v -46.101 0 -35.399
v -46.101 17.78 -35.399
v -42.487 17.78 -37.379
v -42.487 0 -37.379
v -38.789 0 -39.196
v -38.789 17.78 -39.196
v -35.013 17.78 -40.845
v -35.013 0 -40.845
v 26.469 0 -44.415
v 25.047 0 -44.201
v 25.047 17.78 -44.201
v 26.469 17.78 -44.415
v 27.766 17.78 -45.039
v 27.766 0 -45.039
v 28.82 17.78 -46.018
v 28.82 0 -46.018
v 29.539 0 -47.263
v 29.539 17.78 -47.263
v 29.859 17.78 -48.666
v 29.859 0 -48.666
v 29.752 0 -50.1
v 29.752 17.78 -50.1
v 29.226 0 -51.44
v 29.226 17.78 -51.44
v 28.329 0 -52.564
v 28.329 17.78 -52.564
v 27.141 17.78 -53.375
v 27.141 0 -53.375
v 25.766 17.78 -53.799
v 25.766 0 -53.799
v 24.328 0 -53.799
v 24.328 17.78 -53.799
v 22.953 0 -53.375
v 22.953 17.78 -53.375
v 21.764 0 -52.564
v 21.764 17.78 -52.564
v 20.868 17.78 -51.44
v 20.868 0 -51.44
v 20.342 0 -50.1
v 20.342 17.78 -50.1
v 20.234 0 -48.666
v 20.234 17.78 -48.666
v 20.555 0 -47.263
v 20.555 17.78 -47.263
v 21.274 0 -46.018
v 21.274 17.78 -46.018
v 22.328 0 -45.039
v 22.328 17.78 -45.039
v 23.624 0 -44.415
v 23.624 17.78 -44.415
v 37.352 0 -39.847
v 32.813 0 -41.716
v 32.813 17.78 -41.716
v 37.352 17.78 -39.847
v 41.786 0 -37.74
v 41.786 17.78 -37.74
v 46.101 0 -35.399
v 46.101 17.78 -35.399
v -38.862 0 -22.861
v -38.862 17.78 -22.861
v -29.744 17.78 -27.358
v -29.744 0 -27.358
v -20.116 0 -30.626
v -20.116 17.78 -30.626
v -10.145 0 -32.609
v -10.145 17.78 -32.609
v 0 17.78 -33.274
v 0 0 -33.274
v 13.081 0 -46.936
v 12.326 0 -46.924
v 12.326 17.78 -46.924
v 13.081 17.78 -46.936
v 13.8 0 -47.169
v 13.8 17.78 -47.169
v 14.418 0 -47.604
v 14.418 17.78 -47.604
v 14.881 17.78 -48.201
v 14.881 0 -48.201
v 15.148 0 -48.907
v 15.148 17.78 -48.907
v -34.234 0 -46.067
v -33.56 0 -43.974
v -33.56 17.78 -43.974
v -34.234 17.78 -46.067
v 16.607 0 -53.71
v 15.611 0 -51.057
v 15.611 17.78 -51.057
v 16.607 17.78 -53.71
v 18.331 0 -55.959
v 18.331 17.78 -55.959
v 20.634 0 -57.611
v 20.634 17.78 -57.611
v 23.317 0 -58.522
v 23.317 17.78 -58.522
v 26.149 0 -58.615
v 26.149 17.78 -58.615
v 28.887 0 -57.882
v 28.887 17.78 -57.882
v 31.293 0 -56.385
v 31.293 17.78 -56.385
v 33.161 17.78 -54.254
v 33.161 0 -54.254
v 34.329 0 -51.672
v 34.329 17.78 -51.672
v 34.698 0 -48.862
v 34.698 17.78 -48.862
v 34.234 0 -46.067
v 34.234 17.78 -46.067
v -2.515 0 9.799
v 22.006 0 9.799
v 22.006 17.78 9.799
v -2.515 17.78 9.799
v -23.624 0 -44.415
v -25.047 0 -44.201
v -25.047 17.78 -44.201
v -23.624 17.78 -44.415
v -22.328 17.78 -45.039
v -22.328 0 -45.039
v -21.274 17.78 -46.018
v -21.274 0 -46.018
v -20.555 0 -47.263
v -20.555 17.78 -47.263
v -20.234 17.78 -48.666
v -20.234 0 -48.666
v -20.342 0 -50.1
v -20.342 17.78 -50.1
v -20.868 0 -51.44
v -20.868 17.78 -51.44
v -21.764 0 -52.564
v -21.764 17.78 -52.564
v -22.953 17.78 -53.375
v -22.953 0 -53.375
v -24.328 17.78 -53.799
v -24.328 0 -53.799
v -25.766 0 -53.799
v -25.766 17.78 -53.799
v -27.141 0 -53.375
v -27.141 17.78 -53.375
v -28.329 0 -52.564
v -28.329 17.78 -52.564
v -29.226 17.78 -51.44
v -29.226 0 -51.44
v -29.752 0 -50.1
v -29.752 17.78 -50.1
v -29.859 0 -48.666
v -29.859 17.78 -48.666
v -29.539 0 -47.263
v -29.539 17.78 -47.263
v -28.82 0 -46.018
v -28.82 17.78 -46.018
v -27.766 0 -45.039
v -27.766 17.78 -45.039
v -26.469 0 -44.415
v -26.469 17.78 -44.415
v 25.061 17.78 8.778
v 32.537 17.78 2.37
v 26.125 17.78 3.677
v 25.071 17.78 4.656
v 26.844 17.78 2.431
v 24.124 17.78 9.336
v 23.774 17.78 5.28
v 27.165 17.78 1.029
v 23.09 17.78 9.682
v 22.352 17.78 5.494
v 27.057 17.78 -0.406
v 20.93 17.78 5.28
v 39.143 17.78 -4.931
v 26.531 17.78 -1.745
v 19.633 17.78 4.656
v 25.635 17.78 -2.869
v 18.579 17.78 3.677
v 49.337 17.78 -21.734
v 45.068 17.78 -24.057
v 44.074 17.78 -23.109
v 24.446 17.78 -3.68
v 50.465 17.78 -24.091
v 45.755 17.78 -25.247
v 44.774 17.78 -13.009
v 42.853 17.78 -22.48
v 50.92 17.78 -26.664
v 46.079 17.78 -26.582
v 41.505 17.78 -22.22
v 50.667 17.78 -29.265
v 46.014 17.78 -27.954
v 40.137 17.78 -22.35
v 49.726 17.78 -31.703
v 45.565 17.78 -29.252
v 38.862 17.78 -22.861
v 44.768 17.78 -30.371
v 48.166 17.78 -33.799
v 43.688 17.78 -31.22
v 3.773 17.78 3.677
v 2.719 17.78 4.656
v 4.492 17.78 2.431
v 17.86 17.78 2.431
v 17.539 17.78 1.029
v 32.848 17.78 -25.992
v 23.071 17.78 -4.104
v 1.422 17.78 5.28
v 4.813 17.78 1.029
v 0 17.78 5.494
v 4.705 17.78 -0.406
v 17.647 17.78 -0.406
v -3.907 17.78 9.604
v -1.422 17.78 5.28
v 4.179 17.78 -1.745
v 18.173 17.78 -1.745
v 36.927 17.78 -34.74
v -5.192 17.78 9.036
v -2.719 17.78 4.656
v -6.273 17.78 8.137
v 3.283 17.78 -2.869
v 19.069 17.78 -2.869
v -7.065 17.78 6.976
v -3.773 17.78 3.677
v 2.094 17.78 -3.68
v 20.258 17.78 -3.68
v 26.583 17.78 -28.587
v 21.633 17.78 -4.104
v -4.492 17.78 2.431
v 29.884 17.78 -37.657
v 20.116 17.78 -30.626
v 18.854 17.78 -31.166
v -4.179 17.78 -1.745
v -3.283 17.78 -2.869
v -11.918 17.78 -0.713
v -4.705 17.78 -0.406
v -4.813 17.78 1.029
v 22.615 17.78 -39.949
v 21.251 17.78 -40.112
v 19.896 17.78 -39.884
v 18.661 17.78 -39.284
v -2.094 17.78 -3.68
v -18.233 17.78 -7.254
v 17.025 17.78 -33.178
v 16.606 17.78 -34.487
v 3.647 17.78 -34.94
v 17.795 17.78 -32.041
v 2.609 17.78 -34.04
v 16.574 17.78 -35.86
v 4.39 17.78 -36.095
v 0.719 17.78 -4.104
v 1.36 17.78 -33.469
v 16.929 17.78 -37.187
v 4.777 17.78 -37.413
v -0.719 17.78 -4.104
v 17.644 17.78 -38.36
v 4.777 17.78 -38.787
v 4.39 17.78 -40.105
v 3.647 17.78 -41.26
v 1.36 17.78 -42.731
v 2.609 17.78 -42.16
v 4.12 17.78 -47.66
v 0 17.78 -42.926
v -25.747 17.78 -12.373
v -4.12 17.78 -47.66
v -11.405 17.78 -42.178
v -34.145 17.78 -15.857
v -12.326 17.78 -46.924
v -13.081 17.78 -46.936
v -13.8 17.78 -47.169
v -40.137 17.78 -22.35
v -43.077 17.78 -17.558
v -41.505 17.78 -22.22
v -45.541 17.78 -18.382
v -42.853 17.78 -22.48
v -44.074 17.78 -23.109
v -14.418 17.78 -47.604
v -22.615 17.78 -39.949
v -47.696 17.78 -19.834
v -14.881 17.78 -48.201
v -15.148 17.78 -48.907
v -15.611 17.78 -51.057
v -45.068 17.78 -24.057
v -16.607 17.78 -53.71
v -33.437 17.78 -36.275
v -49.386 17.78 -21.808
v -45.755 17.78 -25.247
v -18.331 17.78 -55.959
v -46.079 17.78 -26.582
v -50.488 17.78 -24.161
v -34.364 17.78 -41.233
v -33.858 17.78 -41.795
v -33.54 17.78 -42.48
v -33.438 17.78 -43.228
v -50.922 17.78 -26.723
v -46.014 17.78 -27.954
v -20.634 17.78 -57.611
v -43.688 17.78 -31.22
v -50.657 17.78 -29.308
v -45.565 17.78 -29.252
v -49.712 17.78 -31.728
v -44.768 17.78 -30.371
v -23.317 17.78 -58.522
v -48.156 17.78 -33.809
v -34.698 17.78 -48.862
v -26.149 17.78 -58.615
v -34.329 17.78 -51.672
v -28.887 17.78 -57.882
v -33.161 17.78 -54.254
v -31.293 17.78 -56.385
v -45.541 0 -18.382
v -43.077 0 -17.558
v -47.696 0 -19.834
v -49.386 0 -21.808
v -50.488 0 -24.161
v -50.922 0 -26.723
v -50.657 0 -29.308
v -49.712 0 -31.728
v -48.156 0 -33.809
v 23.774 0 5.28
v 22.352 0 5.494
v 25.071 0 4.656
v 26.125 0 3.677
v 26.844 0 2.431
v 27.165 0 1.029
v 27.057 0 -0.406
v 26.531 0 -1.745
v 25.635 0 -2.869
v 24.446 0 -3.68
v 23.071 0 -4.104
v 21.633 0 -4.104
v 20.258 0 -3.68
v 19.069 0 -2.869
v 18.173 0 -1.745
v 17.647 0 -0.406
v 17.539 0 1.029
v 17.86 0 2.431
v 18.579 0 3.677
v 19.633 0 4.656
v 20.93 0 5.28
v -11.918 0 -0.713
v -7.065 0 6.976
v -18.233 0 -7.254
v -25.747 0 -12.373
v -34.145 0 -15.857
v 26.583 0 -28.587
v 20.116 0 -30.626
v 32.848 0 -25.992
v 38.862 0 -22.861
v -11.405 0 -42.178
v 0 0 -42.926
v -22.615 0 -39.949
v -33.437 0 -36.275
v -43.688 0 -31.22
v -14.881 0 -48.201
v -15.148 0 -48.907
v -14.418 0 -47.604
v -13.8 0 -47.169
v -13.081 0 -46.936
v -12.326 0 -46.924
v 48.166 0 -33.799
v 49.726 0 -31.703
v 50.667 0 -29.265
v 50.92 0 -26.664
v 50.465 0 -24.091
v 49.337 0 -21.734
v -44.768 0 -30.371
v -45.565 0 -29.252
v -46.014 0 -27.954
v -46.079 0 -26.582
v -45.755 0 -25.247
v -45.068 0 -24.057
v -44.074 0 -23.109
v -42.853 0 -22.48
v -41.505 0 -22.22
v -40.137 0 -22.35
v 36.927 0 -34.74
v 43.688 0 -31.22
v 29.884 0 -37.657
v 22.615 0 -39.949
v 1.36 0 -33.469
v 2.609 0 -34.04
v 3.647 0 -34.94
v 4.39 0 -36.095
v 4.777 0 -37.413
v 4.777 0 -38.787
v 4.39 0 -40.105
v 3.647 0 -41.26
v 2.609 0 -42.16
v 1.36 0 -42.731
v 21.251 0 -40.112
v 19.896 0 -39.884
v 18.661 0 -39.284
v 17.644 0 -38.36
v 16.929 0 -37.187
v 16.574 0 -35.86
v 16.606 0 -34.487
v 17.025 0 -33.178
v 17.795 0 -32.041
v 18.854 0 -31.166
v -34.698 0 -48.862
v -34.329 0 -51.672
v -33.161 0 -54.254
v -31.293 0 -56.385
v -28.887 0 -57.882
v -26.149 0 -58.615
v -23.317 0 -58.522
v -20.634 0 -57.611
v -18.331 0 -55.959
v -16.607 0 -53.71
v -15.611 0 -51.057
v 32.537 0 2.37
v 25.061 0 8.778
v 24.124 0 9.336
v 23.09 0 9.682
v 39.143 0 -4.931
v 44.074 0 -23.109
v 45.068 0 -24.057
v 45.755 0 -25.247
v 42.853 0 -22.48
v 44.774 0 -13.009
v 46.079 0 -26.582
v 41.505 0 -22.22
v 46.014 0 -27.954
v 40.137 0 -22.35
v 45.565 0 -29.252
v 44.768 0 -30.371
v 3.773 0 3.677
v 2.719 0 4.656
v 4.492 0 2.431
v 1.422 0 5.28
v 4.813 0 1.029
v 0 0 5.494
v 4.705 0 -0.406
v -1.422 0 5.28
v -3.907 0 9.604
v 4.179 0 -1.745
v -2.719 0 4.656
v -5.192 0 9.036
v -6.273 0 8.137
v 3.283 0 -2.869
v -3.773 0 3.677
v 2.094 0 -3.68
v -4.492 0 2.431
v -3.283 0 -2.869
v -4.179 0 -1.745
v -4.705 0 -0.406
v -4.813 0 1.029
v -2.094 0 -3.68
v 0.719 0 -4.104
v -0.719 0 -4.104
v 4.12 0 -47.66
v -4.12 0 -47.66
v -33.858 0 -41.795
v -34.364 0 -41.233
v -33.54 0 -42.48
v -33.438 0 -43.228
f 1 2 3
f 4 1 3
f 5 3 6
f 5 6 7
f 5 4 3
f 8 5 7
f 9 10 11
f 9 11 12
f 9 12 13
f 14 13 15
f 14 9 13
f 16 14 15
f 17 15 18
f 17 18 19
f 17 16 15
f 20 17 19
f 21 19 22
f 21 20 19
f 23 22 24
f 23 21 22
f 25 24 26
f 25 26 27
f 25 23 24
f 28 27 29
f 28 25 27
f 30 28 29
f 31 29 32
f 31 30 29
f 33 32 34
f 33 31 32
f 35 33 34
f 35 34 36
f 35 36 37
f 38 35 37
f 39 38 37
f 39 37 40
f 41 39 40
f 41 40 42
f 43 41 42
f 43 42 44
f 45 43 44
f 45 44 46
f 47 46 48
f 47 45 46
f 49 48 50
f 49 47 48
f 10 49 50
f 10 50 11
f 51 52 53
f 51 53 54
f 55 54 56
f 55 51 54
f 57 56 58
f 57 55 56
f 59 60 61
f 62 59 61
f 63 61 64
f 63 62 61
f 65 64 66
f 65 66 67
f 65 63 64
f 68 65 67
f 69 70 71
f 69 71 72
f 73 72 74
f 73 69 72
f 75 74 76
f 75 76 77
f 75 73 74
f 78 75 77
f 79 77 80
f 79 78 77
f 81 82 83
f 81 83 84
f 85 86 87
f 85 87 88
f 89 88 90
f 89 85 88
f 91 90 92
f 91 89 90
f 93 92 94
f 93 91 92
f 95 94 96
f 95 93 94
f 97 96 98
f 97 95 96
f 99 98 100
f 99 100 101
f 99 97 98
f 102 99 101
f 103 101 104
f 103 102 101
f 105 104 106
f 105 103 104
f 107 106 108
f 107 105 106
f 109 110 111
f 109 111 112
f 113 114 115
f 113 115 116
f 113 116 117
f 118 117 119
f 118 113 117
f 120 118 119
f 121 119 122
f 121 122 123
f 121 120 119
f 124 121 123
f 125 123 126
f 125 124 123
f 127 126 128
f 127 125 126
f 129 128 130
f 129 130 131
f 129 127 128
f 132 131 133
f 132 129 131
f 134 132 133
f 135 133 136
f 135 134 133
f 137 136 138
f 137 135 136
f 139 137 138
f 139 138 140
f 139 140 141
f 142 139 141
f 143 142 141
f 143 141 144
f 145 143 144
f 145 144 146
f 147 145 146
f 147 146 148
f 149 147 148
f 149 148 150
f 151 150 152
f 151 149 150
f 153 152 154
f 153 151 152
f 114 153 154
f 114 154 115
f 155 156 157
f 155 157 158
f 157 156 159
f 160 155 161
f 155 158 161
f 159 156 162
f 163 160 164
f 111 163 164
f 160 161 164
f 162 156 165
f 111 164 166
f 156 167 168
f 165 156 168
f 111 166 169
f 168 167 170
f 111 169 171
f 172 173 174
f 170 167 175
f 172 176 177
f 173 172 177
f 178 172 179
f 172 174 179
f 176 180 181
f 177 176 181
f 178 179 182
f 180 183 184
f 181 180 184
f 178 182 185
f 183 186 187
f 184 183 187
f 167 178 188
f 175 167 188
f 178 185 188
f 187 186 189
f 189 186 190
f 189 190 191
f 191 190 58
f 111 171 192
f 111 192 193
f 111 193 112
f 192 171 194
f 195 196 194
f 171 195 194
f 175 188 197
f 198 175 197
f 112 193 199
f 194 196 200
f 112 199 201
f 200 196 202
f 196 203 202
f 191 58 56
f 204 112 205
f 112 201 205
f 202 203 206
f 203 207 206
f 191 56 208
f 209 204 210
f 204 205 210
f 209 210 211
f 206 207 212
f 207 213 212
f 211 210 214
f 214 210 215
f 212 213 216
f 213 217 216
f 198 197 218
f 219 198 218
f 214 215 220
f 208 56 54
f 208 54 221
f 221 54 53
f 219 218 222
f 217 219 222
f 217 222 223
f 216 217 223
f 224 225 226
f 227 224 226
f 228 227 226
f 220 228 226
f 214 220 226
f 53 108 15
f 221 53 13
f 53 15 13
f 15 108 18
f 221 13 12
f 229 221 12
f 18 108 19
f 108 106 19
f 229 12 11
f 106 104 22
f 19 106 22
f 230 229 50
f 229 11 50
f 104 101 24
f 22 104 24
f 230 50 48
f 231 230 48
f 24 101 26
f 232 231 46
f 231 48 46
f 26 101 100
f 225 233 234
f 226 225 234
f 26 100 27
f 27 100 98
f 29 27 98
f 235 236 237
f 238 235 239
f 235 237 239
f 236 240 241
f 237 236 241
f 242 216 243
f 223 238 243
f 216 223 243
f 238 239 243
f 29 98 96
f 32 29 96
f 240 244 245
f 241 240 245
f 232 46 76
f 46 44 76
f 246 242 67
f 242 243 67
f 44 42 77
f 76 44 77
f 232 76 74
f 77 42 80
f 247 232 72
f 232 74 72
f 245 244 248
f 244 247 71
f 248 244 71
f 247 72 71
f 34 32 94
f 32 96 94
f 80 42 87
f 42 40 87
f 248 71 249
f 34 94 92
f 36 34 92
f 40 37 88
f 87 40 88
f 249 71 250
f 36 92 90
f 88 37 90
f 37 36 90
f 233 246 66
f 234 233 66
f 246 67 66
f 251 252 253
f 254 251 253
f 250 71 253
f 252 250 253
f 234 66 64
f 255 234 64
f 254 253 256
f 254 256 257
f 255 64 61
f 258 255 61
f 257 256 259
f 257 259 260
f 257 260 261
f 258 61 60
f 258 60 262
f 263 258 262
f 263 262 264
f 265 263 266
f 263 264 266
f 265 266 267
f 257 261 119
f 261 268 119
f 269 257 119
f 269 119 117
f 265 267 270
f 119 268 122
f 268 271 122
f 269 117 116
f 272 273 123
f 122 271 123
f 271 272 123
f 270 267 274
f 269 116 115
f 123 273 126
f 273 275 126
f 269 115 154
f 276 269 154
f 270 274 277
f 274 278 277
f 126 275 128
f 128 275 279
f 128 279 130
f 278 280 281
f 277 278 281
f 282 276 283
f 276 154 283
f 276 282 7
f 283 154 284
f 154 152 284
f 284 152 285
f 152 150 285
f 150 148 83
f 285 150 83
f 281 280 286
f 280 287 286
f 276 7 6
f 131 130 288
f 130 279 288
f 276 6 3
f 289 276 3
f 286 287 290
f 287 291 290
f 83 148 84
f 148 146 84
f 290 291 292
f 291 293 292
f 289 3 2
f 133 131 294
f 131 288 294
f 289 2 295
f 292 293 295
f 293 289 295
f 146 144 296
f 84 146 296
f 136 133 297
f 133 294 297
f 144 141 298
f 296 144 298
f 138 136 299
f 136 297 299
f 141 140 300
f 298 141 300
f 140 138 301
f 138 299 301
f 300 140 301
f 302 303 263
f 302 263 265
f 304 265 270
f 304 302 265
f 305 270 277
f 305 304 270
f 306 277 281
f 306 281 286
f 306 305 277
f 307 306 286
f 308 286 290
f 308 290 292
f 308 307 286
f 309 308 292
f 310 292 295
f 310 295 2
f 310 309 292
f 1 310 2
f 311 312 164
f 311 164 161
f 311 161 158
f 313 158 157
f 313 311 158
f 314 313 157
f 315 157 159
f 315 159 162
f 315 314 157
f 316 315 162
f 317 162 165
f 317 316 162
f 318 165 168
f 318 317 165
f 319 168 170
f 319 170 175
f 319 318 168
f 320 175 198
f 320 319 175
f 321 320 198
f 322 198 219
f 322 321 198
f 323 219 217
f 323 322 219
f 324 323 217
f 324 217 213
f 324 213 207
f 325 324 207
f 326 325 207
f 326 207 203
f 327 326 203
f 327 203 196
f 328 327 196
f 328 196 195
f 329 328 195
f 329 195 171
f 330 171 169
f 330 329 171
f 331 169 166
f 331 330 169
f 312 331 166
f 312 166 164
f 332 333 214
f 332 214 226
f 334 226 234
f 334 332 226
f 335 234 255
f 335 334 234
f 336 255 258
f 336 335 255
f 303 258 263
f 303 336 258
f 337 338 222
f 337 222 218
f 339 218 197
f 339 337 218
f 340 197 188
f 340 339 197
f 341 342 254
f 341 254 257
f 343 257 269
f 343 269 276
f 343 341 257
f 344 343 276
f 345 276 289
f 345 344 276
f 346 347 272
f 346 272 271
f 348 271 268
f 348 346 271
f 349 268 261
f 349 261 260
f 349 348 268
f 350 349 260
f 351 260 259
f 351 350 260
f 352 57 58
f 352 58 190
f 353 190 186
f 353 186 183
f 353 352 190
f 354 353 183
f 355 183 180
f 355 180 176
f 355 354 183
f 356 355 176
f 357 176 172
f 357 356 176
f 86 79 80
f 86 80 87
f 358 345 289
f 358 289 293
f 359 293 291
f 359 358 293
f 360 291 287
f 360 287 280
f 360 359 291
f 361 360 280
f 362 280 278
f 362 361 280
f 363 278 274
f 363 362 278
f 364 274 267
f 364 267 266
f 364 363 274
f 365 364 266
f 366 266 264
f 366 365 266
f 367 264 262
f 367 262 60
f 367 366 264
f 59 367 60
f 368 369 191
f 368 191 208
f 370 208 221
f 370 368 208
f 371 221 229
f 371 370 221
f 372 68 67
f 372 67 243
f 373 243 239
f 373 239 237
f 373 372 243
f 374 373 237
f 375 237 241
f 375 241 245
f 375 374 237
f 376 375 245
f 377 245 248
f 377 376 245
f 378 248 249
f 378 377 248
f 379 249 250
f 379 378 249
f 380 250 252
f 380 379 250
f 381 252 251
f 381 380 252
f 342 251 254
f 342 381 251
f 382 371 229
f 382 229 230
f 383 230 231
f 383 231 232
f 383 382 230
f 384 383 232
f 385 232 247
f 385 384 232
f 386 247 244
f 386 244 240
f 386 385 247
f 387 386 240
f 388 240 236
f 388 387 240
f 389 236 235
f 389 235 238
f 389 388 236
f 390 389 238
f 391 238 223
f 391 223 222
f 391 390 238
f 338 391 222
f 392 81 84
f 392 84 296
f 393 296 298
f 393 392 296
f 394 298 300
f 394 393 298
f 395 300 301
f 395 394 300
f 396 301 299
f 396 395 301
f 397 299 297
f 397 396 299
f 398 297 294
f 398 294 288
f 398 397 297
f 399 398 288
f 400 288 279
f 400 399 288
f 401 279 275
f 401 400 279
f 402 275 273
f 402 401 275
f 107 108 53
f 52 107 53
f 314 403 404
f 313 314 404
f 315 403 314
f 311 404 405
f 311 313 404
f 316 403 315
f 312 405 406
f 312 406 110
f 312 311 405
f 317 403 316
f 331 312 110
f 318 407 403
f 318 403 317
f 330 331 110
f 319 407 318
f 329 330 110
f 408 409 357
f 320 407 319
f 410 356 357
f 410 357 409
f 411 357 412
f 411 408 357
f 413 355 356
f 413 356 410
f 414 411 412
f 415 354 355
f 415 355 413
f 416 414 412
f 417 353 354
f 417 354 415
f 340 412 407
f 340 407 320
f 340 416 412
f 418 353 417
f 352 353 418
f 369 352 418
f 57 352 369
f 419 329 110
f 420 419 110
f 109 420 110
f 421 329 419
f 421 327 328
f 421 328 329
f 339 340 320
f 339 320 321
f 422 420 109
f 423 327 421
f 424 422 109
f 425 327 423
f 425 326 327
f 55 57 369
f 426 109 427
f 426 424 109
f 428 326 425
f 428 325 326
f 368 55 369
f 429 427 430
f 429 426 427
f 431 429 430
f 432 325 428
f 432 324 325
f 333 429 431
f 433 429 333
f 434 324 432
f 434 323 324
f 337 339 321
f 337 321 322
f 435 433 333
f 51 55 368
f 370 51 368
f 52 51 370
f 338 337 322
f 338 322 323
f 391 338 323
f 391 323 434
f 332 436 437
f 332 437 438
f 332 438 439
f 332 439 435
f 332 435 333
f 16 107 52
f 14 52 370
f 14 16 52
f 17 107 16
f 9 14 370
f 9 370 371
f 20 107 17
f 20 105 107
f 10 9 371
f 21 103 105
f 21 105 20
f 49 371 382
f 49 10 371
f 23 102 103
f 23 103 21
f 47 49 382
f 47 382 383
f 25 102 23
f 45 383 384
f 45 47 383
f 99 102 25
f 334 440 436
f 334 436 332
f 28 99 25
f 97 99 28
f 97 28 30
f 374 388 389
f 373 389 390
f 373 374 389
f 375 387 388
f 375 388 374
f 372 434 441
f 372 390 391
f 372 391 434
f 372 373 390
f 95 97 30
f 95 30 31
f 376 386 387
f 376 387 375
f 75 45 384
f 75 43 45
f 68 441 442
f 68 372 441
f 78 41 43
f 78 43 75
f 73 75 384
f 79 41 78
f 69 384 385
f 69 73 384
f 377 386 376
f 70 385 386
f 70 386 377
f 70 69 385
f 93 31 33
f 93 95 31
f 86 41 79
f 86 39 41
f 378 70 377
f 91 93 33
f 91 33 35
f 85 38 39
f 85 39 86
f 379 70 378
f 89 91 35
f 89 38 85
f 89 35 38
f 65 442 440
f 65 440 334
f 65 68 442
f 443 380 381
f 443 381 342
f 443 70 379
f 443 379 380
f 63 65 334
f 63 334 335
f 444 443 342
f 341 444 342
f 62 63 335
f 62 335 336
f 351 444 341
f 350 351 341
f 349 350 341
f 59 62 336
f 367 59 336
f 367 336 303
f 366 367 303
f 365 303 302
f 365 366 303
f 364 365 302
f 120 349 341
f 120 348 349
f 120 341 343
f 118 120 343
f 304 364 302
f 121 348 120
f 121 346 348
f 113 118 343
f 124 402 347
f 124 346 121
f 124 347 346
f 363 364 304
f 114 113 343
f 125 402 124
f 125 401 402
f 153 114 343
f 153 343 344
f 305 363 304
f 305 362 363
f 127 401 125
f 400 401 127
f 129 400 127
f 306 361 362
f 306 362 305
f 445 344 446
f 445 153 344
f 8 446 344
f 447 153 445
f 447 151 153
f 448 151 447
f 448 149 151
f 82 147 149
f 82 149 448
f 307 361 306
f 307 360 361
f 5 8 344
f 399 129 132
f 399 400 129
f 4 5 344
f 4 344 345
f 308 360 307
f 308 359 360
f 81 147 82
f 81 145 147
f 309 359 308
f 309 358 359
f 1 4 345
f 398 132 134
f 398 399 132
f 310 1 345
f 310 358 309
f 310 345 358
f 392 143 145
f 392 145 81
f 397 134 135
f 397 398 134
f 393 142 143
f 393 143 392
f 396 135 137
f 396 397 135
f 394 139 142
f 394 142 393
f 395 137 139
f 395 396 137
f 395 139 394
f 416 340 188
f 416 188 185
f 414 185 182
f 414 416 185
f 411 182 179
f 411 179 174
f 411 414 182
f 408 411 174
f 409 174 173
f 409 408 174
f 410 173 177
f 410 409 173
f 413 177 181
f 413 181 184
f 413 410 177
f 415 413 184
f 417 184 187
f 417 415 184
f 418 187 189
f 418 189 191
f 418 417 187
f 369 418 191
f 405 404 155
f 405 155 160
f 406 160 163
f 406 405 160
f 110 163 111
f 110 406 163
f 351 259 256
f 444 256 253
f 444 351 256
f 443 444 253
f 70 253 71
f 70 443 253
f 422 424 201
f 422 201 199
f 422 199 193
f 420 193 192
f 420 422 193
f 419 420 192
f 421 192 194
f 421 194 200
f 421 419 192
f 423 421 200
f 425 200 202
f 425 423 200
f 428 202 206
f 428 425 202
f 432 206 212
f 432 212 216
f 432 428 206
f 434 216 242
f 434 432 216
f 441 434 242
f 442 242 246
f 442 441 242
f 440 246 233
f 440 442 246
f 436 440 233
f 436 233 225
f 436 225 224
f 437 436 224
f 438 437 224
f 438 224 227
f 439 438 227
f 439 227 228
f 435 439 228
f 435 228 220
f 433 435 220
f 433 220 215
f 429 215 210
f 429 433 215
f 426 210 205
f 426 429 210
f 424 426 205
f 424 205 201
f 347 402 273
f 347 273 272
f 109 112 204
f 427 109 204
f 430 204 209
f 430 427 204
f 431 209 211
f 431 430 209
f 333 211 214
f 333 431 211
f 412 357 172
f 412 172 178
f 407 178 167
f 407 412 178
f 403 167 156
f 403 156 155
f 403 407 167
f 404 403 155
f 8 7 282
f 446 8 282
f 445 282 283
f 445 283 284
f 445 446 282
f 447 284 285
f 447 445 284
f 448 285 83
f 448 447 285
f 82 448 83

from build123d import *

# Parameters (mm, degrees)
SKETCH2_R           = 4.826
BOSS_EXTRUDE1_DEPTH = 17.78


with BuildPart() as part:
    # Sketch2 → Boss-Extrude1 (new body)
    with BuildSketch(Plane(origin=(0, 0, 0), x_dir=(1, 0, 0), z_dir=(0, 1, 0))):
        with BuildLine():
            ThreePointArc((15.610859978, 51.056586824), (27.545075694, 58.349621989), (34.233892096, 46.066560407))
            Line((34.233892096, 46.066560407), (32.812957113, 41.715646574))
            ThreePointArc((32.812957113, 41.715646574), (39.58316936, 38.822933823), (46.101, 35.39927428))
            ThreePointArc((46.101, 35.39927428), (50.667182056, 29.264811664), (49.337445304, 21.733978355))
            ThreePointArc((49.337445304, 21.733978355), (39.143444972, 4.93100158), (25.060604801, -8.777801578))
            ThreePointArc((25.060604801, -8.777801578), (23.616284404, -9.536863302), (22.005826143, -9.798894416))
            Line((22.005826143, -9.798894416), (-2.51457971, -9.798894416))
            ThreePointArc((-2.51457971, -9.798894416), (-5.192160007, -9.035949402), (-7.065470014, -6.976281719))
            ThreePointArc((-7.065470014, -6.976281719), (-21.858610455, 10.006362304), (-43.076963776, 17.558096172))
            ThreePointArc((-43.076963776, 17.558096172), (-50.791269491, 25.427412588), (-46.101, 35.39927428))
            ThreePointArc((-46.101, 35.39927428), (-40.648214467, 38.308271276), (-35.012800321, 40.845443124))
            ThreePointArc((-35.012800321, 40.845443124), (-33.673672112, 42.125267238), (-33.559725058, 43.974112877))
            Line((-33.559725058, 43.974112877), (-34.233892096, 46.066560407))
            ThreePointArc((-34.233892096, 46.066560407), (-27.545075694, 58.349621989), (-15.610859978, 51.056586824))
            Line((-15.610859978, 51.056586824), (-15.148481995, 48.907390587))
            ThreePointArc((-15.148481995, 48.907390587), (-14.125378132, 47.363216824), (-12.325747026, 46.924420733))
            ThreePointArc((-12.325747026, 46.924420733), (0, 47.752), (12.325747026, 46.924420733))
            ThreePointArc((12.325747026, 46.924420733), (14.125378132, 47.363216824), (15.148481995, 48.907390587))
            Line((15.148481995, 48.907390587), (15.610859978, 51.056586824))
        make_face()
        with Locations(Location((0, -0.668228959, 0), (0, 0, 270))):
            Circle(SKETCH2_R, mode=Mode.SUBTRACT)
        with Locations(Location((22.352, -0.668228959, 0), (0, 0, 270))):
            Circle(SKETCH2_R, mode=Mode.SUBTRACT)
        with Locations(Location((-25.046954271, 49.026505913, 0), (0, 0, 270))):
            Circle(SKETCH2_R, mode=Mode.SUBTRACT)
        with Locations(Location((25.046954271, 49.026505913, 0), (0, 0, 270))):
            Circle(SKETCH2_R, mode=Mode.SUBTRACT)
        with BuildLine():
            ThreePointArc((-43.688, 31.219835681), (-45.454438599, 24.627397082), (-38.862, 22.860958484))
            ThreePointArc((-38.862, 22.860958484), (-20.116451462, 30.625618922), (0, 33.274))
            ThreePointArc((0, 33.274), (4.826, 38.1), (0, 42.926))
            ThreePointArc((0, 42.926), (-22.614572885, 39.948734998), (-43.688, 31.219835681))
        make_face(mode=Mode.SUBTRACT)
        with BuildLine():
            ThreePointArc((22.614572885, 39.948734998), (16.703954136, 36.536237672), (20.116451462, 30.625618922))
            ThreePointArc((20.116451462, 30.625618922), (29.743687097, 27.357612785), (38.862, 22.860958484))
            ThreePointArc((38.862, 22.860958484), (45.454438599, 24.627397082), (43.688, 31.219835681))
            ThreePointArc((43.688, 31.219835681), (33.437347586, 36.274898033), (22.614572885, 39.948734998))
        make_face(mode=Mode.SUBTRACT)
    extrude(amount=BOSS_EXTRUDE1_DEPTH)


solid = part.part
